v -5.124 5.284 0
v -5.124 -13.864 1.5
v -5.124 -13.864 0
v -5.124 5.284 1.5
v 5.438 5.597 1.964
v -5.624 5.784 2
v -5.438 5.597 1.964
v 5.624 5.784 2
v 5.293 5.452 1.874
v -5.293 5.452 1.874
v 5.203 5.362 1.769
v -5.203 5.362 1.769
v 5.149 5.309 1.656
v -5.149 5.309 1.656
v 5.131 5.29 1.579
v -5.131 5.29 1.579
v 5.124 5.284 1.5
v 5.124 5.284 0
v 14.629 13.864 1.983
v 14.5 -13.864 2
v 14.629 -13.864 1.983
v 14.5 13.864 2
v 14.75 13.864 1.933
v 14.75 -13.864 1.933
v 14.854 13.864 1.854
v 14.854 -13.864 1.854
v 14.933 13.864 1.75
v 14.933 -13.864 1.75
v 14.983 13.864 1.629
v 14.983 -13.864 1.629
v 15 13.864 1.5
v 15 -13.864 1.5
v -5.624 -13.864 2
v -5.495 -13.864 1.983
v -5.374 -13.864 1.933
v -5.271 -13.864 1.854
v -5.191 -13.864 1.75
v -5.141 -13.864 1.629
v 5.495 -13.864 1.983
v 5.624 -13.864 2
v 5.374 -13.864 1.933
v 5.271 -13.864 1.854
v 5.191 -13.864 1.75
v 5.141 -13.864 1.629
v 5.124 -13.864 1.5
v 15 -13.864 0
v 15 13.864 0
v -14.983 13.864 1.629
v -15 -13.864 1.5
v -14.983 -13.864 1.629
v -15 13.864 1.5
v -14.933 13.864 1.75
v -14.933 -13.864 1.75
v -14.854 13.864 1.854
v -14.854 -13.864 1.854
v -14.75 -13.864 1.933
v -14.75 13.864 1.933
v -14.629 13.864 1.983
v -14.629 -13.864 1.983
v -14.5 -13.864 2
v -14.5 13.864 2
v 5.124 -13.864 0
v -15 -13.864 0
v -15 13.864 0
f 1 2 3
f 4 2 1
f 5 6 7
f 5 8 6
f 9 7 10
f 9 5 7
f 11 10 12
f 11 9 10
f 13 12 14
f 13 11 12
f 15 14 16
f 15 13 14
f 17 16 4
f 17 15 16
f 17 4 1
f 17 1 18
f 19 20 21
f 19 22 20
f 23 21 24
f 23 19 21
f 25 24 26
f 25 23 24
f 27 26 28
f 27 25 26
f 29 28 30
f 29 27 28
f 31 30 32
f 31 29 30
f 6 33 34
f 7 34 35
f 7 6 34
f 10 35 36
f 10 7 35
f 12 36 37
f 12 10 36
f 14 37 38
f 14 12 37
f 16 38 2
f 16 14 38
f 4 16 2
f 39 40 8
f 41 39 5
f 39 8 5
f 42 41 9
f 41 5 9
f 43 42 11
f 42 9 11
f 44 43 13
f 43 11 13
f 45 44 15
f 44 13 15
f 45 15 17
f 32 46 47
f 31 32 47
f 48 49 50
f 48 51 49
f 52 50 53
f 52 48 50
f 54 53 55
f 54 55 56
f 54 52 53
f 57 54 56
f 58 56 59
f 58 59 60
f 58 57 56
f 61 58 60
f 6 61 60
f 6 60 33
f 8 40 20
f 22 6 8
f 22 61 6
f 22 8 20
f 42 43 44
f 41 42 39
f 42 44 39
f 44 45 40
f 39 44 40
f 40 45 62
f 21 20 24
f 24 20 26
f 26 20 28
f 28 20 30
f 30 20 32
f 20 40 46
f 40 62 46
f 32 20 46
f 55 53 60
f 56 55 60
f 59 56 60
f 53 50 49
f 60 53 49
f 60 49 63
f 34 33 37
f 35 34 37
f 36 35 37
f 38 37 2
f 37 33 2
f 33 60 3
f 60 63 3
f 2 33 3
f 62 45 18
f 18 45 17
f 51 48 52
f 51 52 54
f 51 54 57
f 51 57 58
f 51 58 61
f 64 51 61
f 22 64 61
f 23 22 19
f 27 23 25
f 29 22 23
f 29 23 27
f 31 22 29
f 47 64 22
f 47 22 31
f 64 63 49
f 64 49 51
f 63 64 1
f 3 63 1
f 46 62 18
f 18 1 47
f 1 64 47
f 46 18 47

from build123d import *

# Parameters (mm, degrees)
SKETCH1_W           = 30
SKETCH1_H           = 27.727272728
BOSS_EXTRUDE1_DEPTH = 2
SKETCH2_W           = 10.248894408
SKETCH2_H           = 19.156033471
CUT_EXTRUDE1_DEPTH  = 2
FILLET1_R           = 0.5
FILLET2_R           = 0.5
FILLET3_R           = 0.5
FILLET4_R           = 0.5
FILLET5_R           = 0.5


with BuildPart() as part:
    # Sketch1 → Boss-Extrude1 (new body)
    with BuildSketch(Plane.XY):
        Rectangle(SKETCH1_W, SKETCH1_H)
    extrude(amount=BOSS_EXTRUDE1_DEPTH)

    # Sketch2 → Cut-Extrude1 (cut)
    with BuildSketch(Plane.XY.offset(2)):
        with Locations((0, -4.294276099)):
            Rectangle(SKETCH2_W, SKETCH2_H)
    extrude(amount=-CUT_EXTRUDE1_DEPTH, mode=Mode.SUBTRACT)

    # Fillet1
    fillet1_edges = [part.edges().sort_by_distance(p)[0] for p in [
        (-15, 0, 2),
    ]]
    fillet(fillet1_edges, radius=FILLET1_R)

    # Fillet2
    fillet2_edges = [part.edges().sort_by_distance(p)[0] for p in [
        (15, 0, 2),
    ]]
    fillet(fillet2_edges, radius=FILLET2_R)

    # Fillet3
    fillet3_edges = [part.edges().sort_by_distance(p)[0] for p in [
        (-5.124447204, -4.289947863, 2),
    ]]
    fillet(fillet3_edges, radius=FILLET3_R)

    # Fillet4
    fillet4_edges = [part.edges().sort_by_distance(p)[0] for p in [
        (5.124447204, -4.289947863, 2),
    ]]
    fillet(fillet4_edges, radius=FILLET4_R)

    # Fillet5
    fillet5_edges = [part.edges().sort_by_distance(p)[0] for p in [
        (0, 5.283740637, 2),
    ]]
    fillet(fillet5_edges, radius=FILLET5_R)


solid = part.part
